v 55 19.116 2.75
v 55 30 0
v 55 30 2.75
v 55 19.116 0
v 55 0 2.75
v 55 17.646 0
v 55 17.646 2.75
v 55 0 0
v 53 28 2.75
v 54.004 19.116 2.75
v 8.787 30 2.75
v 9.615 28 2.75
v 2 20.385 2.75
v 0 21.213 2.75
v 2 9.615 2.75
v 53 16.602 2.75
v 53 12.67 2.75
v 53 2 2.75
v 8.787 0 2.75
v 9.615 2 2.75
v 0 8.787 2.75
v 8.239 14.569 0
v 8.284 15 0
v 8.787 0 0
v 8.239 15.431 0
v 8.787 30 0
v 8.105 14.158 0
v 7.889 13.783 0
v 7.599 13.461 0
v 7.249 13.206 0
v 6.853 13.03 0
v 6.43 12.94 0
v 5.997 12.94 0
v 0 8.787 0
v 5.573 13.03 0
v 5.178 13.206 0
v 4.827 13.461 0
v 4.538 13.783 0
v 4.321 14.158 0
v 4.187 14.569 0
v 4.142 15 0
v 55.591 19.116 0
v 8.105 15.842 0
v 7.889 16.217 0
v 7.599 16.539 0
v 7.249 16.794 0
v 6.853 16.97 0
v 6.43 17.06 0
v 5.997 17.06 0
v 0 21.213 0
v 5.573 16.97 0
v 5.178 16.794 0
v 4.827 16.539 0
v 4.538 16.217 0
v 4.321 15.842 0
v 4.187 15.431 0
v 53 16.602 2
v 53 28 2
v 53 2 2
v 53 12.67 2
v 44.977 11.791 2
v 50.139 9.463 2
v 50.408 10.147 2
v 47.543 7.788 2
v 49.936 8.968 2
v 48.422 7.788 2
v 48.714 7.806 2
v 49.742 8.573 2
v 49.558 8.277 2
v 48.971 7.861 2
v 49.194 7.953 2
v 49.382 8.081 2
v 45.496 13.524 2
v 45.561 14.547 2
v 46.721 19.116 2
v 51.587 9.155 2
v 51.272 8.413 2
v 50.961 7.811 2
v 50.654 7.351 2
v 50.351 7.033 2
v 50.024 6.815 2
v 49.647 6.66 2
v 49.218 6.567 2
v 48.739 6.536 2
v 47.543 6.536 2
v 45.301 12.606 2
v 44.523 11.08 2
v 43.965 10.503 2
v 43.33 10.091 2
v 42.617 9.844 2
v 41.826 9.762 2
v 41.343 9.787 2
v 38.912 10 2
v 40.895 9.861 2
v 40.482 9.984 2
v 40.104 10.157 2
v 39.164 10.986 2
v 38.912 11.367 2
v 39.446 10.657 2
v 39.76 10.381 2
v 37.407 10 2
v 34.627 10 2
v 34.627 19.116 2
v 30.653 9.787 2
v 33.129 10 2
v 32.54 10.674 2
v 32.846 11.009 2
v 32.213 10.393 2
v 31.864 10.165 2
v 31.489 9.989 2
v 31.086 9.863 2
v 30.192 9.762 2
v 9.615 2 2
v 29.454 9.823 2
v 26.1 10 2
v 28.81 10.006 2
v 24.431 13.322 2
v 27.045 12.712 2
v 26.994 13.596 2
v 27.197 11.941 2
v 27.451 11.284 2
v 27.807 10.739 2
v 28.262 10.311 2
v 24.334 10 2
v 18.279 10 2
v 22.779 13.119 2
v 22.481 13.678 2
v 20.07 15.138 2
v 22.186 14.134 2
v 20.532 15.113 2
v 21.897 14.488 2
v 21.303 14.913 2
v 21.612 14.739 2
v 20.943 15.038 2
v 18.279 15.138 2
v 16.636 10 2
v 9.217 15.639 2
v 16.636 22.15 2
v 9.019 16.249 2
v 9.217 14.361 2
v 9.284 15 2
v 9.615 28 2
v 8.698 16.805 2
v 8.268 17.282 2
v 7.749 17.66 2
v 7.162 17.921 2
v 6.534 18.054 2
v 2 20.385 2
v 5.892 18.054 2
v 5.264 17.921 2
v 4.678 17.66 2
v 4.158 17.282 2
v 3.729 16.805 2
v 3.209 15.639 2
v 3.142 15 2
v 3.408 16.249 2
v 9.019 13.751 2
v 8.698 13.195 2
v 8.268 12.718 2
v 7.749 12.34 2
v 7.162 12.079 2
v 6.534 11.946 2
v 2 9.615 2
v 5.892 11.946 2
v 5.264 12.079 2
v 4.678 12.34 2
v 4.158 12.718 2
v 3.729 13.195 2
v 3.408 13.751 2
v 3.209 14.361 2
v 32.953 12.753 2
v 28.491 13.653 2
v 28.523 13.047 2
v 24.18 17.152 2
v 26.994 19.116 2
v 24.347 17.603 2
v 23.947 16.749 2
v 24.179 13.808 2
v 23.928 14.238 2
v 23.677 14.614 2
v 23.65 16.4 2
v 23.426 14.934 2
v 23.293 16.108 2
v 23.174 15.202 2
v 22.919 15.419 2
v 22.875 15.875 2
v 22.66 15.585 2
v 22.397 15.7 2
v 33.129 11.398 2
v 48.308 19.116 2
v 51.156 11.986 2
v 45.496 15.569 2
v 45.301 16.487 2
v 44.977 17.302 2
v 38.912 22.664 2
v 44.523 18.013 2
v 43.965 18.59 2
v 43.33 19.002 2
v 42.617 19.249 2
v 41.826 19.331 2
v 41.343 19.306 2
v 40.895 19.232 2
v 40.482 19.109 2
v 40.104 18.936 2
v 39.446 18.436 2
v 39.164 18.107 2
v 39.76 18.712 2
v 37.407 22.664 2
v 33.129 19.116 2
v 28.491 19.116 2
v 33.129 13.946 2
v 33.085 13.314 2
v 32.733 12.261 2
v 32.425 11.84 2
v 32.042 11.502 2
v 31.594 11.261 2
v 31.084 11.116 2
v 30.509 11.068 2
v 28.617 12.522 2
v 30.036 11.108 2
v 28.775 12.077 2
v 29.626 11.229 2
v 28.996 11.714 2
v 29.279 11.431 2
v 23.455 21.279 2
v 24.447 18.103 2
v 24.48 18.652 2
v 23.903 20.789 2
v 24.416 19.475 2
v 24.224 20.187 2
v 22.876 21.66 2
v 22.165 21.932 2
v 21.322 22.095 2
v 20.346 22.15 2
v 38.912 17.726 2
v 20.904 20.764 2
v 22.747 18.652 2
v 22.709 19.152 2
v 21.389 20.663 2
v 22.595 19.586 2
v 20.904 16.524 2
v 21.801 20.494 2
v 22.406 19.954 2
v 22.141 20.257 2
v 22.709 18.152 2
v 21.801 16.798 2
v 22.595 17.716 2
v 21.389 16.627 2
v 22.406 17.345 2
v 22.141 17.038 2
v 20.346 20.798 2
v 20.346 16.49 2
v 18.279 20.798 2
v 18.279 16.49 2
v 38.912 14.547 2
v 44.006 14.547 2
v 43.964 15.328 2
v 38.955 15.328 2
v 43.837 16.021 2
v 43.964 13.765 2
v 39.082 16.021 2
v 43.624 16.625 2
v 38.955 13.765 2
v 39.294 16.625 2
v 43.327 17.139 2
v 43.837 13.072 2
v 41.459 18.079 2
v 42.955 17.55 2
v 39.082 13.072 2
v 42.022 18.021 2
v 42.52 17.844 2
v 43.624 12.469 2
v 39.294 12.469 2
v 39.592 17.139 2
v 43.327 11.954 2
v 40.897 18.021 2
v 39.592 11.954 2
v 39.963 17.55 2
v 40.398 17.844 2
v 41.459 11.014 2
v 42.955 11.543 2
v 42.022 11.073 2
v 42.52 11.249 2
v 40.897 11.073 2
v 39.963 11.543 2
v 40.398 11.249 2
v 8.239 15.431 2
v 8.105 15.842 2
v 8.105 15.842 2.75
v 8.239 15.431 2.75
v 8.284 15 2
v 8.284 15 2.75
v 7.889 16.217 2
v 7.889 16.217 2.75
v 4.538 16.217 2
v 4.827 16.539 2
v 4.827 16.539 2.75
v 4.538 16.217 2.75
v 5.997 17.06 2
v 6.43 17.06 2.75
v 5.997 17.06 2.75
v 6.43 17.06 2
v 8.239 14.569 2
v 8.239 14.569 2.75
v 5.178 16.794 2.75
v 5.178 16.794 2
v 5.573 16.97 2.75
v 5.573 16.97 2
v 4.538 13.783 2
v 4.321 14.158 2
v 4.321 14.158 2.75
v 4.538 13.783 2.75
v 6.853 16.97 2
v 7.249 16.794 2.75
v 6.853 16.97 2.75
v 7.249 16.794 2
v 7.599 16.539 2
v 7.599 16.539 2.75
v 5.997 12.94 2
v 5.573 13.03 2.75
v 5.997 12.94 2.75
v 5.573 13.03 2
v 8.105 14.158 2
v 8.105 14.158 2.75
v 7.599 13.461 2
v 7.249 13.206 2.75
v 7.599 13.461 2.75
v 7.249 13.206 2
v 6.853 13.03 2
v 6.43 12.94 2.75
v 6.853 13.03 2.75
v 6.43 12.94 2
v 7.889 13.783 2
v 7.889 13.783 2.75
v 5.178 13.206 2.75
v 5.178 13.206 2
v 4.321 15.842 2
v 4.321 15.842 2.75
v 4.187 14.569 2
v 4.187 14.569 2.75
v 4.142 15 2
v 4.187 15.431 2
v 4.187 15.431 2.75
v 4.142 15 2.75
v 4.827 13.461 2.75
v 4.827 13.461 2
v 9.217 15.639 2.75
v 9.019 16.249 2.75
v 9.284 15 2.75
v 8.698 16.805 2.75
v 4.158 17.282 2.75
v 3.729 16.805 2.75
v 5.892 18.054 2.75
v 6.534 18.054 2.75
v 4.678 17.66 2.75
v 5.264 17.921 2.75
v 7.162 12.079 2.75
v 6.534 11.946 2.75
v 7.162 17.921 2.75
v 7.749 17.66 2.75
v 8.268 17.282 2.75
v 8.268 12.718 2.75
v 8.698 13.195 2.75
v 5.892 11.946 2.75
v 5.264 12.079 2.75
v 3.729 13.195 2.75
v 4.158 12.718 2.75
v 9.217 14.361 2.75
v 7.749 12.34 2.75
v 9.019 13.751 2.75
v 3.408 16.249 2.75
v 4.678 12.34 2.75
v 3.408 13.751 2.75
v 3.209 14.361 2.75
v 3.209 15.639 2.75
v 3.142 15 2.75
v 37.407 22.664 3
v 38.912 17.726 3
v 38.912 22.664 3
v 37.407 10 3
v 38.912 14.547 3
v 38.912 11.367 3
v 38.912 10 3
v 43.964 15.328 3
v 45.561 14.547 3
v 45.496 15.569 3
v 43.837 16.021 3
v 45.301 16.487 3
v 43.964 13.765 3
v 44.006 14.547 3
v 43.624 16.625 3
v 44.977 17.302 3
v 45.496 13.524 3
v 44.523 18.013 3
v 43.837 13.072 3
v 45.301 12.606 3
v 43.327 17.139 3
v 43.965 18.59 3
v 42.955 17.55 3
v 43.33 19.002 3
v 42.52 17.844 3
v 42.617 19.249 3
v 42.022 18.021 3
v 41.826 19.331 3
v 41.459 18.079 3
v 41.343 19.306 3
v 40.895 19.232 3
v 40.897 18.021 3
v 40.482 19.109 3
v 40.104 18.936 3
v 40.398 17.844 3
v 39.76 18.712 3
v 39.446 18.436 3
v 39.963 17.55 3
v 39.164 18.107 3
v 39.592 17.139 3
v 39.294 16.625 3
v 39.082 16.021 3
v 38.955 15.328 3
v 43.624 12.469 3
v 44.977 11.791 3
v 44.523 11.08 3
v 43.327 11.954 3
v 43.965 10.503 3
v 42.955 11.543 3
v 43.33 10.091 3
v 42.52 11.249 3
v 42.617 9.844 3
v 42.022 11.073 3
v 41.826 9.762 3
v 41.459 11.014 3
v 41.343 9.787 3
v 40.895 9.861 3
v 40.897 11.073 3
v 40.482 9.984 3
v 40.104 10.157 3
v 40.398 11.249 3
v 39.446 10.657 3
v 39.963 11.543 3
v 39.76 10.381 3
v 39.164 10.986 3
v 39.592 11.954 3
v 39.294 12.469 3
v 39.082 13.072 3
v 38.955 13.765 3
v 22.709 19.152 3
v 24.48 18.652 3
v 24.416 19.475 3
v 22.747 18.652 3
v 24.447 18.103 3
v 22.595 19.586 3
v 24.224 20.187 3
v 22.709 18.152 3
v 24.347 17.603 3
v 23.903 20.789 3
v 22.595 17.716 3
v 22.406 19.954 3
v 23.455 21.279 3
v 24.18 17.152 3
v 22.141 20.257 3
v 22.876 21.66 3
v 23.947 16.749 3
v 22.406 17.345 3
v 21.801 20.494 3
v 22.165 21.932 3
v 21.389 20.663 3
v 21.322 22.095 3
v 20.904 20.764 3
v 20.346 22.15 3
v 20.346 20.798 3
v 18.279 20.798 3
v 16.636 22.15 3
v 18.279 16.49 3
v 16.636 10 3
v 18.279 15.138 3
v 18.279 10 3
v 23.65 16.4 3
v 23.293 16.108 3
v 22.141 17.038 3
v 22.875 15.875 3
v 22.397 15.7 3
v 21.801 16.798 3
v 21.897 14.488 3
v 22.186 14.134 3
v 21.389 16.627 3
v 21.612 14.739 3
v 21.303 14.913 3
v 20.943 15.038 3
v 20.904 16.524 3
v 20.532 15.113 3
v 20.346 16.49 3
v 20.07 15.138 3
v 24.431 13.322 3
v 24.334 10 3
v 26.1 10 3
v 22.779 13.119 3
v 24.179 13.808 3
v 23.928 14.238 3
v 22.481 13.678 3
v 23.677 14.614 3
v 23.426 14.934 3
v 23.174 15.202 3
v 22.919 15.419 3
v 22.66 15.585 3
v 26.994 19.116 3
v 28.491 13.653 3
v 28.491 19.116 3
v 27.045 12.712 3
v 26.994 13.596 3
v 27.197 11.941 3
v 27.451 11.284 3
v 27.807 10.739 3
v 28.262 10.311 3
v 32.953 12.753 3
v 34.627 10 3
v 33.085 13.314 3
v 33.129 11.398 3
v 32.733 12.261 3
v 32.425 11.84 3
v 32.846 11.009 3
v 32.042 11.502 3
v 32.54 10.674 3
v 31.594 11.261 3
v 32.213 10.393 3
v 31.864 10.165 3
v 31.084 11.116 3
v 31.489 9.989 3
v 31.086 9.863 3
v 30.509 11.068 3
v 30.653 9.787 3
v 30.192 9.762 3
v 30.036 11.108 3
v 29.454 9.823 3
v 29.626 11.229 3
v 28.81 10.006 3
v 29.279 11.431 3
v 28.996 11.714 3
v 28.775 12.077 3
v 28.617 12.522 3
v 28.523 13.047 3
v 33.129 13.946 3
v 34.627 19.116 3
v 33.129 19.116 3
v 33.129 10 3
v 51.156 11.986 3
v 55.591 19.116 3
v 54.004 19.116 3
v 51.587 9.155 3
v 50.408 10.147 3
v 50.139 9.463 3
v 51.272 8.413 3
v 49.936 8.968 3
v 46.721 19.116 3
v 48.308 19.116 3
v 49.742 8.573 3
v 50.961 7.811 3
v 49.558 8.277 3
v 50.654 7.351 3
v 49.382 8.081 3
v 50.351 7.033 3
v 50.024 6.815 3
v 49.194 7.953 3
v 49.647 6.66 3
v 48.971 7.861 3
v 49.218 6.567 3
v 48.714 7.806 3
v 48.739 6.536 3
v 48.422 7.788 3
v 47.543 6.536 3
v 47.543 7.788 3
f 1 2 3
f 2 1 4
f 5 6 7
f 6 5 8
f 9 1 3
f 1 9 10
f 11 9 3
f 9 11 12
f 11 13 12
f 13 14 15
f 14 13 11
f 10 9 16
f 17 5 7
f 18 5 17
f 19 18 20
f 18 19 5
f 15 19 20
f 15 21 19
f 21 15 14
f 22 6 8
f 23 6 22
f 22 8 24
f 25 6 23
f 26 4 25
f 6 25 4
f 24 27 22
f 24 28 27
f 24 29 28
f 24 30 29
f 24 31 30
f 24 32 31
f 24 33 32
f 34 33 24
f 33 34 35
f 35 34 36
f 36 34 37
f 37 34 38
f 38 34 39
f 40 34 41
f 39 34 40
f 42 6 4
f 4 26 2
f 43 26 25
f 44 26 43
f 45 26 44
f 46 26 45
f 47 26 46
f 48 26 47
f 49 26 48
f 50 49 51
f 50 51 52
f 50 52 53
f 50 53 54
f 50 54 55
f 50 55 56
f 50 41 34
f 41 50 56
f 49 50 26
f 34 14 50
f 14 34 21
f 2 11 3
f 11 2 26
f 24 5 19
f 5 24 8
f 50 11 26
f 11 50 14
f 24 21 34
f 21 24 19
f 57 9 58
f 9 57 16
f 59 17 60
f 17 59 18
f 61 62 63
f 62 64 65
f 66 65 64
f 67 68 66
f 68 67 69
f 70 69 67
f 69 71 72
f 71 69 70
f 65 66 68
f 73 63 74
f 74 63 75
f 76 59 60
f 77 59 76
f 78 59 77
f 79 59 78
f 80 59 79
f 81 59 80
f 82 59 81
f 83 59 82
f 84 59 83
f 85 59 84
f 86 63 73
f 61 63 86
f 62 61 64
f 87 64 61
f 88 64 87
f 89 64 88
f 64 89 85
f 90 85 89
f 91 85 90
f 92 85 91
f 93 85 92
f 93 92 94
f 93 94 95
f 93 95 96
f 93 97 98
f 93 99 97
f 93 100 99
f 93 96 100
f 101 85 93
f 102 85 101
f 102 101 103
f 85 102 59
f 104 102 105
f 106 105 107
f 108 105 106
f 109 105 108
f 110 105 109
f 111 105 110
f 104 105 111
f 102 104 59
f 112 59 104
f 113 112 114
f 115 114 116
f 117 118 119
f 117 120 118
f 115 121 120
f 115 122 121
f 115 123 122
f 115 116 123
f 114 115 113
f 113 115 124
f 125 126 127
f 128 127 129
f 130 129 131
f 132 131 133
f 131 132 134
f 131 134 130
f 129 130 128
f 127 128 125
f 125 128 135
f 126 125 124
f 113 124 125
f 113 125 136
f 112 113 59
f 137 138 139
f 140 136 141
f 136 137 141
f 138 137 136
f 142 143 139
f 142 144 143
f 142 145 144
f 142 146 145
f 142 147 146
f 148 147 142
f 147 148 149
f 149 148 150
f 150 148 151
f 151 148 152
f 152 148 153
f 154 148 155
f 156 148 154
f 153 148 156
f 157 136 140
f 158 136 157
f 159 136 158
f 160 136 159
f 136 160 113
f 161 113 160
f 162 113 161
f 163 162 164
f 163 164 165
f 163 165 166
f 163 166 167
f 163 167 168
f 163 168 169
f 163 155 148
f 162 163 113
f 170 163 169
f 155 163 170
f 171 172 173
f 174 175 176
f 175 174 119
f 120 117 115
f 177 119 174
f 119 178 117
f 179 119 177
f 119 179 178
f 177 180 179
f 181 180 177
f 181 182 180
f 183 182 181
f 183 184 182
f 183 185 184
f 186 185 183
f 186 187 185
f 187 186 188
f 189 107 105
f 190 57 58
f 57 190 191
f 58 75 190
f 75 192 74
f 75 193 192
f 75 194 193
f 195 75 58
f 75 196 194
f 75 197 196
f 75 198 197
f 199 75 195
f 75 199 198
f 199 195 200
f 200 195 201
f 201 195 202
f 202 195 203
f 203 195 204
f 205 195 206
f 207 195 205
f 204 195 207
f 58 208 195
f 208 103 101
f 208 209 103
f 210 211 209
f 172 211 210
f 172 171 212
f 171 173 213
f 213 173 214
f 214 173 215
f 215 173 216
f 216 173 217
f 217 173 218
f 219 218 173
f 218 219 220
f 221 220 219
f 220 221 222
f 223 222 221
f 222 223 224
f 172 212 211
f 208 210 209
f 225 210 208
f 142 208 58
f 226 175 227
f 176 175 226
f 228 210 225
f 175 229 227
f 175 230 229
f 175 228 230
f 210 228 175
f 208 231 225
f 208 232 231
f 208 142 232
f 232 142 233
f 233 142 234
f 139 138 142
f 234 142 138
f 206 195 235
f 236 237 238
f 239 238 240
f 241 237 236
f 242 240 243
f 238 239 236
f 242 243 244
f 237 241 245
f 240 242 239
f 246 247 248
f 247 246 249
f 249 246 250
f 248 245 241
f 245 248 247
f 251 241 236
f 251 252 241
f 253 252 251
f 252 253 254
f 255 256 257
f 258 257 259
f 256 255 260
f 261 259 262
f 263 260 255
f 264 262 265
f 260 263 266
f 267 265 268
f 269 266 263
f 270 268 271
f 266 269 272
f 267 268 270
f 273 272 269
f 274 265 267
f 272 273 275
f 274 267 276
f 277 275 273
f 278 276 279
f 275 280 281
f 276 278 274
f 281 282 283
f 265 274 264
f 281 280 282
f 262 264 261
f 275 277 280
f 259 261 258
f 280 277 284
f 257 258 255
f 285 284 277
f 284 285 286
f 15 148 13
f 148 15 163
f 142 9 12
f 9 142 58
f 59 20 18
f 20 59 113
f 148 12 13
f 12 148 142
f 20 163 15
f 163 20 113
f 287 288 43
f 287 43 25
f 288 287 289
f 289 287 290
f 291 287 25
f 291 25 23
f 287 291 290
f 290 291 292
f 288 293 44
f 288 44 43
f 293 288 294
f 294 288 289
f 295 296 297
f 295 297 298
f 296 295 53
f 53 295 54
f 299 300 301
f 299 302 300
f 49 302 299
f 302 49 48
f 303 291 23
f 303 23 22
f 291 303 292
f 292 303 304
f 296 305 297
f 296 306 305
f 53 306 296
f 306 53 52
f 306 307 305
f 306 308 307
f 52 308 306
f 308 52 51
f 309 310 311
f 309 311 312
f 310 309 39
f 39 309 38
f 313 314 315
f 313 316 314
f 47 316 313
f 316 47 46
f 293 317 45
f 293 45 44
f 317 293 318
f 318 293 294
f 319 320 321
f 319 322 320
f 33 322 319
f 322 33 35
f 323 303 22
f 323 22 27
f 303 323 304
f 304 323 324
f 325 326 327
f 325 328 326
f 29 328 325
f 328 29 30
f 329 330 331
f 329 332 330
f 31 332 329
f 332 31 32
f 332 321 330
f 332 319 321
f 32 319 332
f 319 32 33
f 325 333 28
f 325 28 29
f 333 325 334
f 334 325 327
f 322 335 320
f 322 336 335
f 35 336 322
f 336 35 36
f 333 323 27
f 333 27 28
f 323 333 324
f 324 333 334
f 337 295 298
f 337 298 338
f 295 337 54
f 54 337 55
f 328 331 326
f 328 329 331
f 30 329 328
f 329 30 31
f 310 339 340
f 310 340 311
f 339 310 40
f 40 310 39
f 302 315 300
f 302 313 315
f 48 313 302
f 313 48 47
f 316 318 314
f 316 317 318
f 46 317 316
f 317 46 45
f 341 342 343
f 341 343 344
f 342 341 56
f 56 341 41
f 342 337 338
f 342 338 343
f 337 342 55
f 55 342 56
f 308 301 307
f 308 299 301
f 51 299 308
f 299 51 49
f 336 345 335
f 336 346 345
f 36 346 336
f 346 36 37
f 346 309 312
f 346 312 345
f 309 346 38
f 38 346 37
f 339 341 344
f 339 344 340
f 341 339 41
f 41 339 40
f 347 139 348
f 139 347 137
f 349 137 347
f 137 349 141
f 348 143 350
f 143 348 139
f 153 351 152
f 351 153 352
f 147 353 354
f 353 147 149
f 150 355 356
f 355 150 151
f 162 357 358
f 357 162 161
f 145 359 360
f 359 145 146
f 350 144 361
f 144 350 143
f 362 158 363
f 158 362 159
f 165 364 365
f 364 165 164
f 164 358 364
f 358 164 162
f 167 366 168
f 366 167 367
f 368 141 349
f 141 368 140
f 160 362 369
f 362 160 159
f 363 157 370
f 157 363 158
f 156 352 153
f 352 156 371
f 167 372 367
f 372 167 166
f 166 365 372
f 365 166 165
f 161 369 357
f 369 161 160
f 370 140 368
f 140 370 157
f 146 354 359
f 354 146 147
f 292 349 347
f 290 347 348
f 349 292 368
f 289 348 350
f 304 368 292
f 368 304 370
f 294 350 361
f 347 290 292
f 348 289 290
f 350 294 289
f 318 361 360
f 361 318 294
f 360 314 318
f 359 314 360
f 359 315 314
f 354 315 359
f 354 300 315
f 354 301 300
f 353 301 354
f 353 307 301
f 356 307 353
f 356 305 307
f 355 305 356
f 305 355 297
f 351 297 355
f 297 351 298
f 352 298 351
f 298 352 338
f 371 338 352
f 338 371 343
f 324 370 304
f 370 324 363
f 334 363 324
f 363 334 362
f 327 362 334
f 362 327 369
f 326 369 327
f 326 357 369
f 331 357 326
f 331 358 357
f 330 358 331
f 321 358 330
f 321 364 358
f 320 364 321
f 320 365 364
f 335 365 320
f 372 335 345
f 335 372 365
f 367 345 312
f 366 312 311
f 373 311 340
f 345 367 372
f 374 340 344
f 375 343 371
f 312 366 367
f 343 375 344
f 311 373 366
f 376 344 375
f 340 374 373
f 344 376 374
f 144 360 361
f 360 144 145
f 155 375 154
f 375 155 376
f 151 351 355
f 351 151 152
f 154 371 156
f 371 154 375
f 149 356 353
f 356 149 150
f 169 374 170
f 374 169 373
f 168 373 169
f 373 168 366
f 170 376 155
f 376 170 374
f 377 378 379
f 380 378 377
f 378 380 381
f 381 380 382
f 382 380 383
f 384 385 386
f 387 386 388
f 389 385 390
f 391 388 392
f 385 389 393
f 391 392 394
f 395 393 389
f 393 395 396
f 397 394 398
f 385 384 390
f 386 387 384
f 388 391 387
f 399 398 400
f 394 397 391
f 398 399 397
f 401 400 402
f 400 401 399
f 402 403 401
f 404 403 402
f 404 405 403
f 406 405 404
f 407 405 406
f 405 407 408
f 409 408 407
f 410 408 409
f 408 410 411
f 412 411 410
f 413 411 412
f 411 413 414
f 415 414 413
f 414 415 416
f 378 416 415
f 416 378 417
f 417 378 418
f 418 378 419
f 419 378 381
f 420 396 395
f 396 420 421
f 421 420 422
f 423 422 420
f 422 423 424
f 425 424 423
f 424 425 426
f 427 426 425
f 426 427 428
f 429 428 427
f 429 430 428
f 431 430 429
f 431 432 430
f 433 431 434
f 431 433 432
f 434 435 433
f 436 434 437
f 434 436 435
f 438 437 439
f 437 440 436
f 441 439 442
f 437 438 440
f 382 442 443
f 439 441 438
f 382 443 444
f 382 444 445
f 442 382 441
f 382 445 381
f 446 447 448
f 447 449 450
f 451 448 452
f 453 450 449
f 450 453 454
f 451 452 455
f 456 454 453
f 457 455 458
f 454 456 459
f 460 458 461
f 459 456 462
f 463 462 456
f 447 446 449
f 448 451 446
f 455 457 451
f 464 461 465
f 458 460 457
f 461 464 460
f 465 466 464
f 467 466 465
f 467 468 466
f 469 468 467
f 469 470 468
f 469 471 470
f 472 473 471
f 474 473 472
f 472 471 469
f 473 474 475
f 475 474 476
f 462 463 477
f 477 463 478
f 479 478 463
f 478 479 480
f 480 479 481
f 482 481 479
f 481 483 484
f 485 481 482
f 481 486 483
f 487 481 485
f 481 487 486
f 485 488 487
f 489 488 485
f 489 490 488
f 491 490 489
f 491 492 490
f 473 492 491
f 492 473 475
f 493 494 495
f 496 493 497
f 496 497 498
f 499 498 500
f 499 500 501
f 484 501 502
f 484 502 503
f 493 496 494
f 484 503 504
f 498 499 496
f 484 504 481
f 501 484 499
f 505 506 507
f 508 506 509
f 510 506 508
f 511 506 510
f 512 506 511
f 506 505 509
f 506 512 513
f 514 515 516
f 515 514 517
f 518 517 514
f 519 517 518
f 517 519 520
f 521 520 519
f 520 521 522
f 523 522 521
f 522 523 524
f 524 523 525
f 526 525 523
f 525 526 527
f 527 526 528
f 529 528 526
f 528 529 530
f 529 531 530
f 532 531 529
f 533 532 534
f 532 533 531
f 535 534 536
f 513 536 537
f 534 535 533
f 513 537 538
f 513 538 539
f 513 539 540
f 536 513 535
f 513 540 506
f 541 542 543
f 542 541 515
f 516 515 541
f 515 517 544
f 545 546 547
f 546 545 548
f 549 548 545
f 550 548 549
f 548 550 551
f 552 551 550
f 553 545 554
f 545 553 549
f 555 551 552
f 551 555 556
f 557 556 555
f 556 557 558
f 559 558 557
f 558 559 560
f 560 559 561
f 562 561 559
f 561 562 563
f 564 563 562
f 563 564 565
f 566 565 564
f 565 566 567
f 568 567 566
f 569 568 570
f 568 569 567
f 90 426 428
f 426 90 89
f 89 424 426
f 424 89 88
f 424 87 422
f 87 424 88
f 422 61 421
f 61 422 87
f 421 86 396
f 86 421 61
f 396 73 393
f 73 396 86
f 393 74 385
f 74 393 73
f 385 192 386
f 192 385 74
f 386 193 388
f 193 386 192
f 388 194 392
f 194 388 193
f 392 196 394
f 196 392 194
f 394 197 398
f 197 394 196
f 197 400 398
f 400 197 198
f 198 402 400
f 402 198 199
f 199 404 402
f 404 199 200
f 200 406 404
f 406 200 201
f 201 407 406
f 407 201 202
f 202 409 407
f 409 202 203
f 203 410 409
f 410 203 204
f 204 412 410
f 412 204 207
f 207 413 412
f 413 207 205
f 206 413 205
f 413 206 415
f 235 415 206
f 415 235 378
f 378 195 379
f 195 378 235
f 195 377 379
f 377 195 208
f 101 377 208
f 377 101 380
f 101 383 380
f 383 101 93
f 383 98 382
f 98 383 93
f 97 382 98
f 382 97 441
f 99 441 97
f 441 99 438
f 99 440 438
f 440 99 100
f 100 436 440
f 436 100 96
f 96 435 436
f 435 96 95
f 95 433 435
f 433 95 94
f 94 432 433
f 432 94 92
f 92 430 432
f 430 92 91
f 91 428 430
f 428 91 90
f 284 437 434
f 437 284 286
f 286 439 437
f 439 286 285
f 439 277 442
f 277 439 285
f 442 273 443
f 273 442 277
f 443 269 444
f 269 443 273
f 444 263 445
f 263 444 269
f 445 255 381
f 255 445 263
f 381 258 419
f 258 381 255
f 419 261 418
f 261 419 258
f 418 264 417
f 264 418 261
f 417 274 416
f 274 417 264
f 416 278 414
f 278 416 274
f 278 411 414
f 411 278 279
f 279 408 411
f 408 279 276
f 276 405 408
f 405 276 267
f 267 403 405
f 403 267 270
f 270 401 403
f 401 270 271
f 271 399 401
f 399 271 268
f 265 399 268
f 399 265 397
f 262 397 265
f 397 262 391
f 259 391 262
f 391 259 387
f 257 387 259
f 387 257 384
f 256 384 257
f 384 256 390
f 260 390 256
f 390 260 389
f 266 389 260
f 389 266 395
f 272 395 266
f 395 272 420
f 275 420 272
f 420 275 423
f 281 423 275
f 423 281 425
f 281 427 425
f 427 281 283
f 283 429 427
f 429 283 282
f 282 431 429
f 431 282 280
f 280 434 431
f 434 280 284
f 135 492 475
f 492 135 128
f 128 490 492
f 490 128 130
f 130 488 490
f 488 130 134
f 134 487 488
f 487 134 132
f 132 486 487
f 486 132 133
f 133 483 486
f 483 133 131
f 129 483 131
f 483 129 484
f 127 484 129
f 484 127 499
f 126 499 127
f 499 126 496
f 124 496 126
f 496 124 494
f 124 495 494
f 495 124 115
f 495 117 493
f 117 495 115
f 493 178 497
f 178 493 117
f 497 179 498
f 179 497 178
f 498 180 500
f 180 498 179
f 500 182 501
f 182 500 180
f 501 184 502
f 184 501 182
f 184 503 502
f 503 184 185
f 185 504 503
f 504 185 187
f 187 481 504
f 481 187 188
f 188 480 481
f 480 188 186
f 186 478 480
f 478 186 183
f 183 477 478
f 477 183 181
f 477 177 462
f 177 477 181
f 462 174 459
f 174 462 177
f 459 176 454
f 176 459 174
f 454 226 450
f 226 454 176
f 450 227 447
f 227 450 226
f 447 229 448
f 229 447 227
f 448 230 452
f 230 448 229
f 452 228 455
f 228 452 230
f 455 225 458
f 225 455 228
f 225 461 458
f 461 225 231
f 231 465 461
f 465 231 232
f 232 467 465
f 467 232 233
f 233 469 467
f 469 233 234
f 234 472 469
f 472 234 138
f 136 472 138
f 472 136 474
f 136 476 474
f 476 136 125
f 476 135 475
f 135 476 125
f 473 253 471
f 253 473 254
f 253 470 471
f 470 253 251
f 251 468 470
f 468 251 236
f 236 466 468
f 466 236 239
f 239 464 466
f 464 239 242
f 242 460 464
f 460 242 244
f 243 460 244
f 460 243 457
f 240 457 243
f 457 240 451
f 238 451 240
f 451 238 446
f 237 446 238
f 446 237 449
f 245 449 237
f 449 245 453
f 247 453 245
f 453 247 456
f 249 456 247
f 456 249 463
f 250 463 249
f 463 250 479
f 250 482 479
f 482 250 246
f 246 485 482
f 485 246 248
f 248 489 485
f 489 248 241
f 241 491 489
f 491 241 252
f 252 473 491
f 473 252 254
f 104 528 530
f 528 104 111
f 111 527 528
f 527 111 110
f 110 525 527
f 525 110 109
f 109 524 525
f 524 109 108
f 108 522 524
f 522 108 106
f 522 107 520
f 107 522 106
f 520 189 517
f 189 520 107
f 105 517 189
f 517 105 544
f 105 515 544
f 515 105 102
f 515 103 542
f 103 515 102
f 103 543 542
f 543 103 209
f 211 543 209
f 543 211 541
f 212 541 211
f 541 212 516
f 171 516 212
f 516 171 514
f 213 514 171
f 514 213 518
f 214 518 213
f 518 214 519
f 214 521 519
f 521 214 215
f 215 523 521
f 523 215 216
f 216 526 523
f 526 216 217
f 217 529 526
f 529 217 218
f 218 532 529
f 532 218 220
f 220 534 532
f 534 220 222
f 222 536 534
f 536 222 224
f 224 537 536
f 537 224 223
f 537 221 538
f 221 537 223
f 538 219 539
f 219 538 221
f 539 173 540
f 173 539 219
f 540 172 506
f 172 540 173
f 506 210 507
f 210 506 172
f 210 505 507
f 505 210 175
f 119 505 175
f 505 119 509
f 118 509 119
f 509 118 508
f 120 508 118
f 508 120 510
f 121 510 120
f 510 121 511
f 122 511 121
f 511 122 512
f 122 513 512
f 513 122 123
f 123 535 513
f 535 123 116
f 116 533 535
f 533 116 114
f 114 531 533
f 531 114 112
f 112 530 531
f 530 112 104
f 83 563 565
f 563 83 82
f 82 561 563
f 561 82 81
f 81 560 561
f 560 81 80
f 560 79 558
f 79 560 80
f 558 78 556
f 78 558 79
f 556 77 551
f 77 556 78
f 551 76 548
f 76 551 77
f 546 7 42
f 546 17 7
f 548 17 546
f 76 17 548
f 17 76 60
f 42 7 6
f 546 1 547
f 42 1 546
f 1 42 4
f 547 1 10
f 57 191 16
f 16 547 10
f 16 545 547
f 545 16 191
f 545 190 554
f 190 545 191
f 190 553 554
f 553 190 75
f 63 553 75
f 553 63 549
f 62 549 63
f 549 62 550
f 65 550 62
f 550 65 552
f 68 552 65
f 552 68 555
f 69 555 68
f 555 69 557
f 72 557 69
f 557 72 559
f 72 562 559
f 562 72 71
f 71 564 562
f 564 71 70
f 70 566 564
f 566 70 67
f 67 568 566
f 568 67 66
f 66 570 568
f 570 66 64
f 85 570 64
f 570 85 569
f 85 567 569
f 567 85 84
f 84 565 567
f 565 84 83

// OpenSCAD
//Personalized and Parameterized Gift Tags
//By Brad Wagner (c) 2012
//Creative Commons License, yada yada.

//I made these for my new printer for Christmas giving/showing off. Damn I'm good. :P

//Print these with a 2 solid layers top and bottom and one perimeter for best results.

/*[Text]*/
tag_name="Ruby";

tag_width = 55; //[25,30,35,40,45,50,55,60,65,70,75,80,85,90,95,100,105,110,115,120,125,130,135,140,145,150,155,160,165,170]

tag_height = 30; //[5,10,15,20,25,30,35,40,45,50]

text_centering_height = 10; 

text_centering_left_to_right = 15; 

What_font="Yesteryear"; //[Abril Fatface,Aclonica,Acme,Advent Pro,Akronim,Aladin,Alegreya,Alegreya Sans,Alegreya SC,Alex Brush,Alfa Slab One,Alice,Amaranth,Architects Daughter,Archivo Black,Archivo Narrow,Arimo,Arvo,Asap,Astloch,Asul,Averia Libre,Averia Serif Libre,Bangers,Basic,Belgrano,Berkshire Swash,Bigshot One,Bilbo Swash Caps,Black Ops One,Bonbon,Bowlby One SC,Brawler,Bubblegum Sans,Butterfly Kids,Cabin Condensed,Caesar Dressing,Cagliostro,Calligraffitti,Capriola,Carter One,Changa One,Chango,Chelsea Market,Cherry Cream Soda,Chewy,Chicle,Chivo,Clicker Script,Coming Soon,Concert One,Condiment,Cookie,Courgette,Covered By Your Grace,Crimson Text,Dancing Script,DejaVu Sans,DejaVu Serif,Dhurjati,Doppio One,Dosis,Droid Sans,Eagle Lake,Electrolize,Emilys Candy,Encode Sans,Encode Sans Compressed,Euphoria Script,Exo,Exo 2,Faster One,Federo,Finger Paint,Fjord One,Fontdiner Swanky,Freckle Face,Fruktur,Gabriela,Geo,Germania One,Give You Glory,Gloria Hallelujah,Goudy Bookletter 1911,Graduate,Grand Hotel,Great Vibes,Griffy,Hanalei Fill,Happy Monkey,Henny Penny,Hind,IM Fell English SC,Indie Flower,Irish Grover,Italianno,Jacques Francois Shadow,Jolly Lodger,Josefin Slab,Joti One,Judson,Just Another Hand,Kalam,Kameron,Karma,Kavoon,Knewave,Kranky,Kristi,Laila,Lakki Reddy,Lancelot,Lato,Leckerli One,Ledger,Lekton,Lemon One,Liberation Sans,Libre Caslon Text,Life Savers,Lilita One,Lily Script One,Limelight,Lobster,Lobster Two,Londrina Outline,Londrina Shadow,Londrina Solid,Lora,Love Ya Like A Sister,Loved by the King,Lovers Quarrel,Luckiest Guy,Lusitana,Macondo,Macondo Swash Caps,Mako,Marck Script,Margarine,Marko One,Maven Pro,McLaren,MedievalSharp,Merienda One,Merriweather,Mervale Script,Metal Mania,Metrophobic,Milonga,Miltonian Tattoo,Miss Fajardose,Molle,Montez,Montserrat,Mr De Haviland,Mystery Quest,Neucha,New Rocker,Niconne,Nosifer,Nothing You Could Do,Noto Sans Oriya,Noto Serif,Nova Square,Nunito,Old Standard TT,Oleo Script,Oleo Script Swash Caps,Orbitron,Oregano,Orienta,Original Surfer,Oswald,Over the Rainbow,Overlock,Oxygen,Pacifico,Paprika,Parisienne,Patrick Hand SC,Paytone One,Peralta,Permanent Marker,Piedra,Pirata One,Play,Playball,Poetsen One,Poppins,Press Start 2P,Princess Sofia,PT Mono,Qwigley,Racing Sans One,Raleway,Rancho,Ranga,Ribeye,Roboto,Roboto Condensed,Roboto Slab,Rochester,Rock Salt,Rubik One,Sail,Salsa,Sansita One,Sarina,Satisfy,Schoolbell,Seaweed Script,Sevillana,Shadows Into Light,Shadows Into Light Two,Share,Six Caps,Skranji,Source Sans Pro,Spicy Rice,Stardos Stencil,Stoke,Syncopate,Teko,Terminal Dosis,The Girl Next Door,Tillana,Timmana,Titillium Web,Ubuntu,Ultra,Underdog,UnifrakturCook,UnifrakturMaguntia,Vampiro One,Vidaloka,Viga,Voces,Volkhov,Vollkorn,Voltaire,Waiting for the Sunrise,Wallpoet,Wellfleet,Wendy One,Yellowtail,Yesteryear,Zeyada]

font_size = 12; //[5,6,7,8,9,10,11,12,13,14,15,16,17,18,19]

// Hidden parameter
module stopCustomizer(){}

depth = 2;
letter_height = .75;
$fn=30;

//Let x be the length of one of three tag sides
x = (tag_height*sqrt(2)) / (2 + sqrt(2));

module tagName()
{
    linear_extrude(height = 3)
    text(tag_name, size = font_size, font = What_font);
}

difference() {
	tag(tag_width, tag_height, depth + letter_height);
	translate([2,2,depth]) tag(tag_width-4, tag_height-4, depth);
	translate([x/2, tag_height/2, 0]) cylinder(depth+letter_height, x/6, x/6);
}

difference() {
	translate([x/2, tag_height/2, 0]) cylinder(depth+letter_height, x/6+1, x/6+1);
#	translate([x/2, tag_height/2, 0]) cylinder(depth+letter_height, x/6, x/6);
}

module tag(w, h, d) {

	p_x = (h*sqrt(2)) / (2 + sqrt(2));

	difference() {
		cube([w, h, d]);

		translate([-p_x/2, h/2, 0]) rotate([0,0,45]) cube([50,50,d]);
		translate([-p_x/2, h/2, 0]) rotate([0,0,225]) cube([50,50,d]);
	}

}
translate([text_centering_left_to_right, text_centering_height,0]) tagName();
